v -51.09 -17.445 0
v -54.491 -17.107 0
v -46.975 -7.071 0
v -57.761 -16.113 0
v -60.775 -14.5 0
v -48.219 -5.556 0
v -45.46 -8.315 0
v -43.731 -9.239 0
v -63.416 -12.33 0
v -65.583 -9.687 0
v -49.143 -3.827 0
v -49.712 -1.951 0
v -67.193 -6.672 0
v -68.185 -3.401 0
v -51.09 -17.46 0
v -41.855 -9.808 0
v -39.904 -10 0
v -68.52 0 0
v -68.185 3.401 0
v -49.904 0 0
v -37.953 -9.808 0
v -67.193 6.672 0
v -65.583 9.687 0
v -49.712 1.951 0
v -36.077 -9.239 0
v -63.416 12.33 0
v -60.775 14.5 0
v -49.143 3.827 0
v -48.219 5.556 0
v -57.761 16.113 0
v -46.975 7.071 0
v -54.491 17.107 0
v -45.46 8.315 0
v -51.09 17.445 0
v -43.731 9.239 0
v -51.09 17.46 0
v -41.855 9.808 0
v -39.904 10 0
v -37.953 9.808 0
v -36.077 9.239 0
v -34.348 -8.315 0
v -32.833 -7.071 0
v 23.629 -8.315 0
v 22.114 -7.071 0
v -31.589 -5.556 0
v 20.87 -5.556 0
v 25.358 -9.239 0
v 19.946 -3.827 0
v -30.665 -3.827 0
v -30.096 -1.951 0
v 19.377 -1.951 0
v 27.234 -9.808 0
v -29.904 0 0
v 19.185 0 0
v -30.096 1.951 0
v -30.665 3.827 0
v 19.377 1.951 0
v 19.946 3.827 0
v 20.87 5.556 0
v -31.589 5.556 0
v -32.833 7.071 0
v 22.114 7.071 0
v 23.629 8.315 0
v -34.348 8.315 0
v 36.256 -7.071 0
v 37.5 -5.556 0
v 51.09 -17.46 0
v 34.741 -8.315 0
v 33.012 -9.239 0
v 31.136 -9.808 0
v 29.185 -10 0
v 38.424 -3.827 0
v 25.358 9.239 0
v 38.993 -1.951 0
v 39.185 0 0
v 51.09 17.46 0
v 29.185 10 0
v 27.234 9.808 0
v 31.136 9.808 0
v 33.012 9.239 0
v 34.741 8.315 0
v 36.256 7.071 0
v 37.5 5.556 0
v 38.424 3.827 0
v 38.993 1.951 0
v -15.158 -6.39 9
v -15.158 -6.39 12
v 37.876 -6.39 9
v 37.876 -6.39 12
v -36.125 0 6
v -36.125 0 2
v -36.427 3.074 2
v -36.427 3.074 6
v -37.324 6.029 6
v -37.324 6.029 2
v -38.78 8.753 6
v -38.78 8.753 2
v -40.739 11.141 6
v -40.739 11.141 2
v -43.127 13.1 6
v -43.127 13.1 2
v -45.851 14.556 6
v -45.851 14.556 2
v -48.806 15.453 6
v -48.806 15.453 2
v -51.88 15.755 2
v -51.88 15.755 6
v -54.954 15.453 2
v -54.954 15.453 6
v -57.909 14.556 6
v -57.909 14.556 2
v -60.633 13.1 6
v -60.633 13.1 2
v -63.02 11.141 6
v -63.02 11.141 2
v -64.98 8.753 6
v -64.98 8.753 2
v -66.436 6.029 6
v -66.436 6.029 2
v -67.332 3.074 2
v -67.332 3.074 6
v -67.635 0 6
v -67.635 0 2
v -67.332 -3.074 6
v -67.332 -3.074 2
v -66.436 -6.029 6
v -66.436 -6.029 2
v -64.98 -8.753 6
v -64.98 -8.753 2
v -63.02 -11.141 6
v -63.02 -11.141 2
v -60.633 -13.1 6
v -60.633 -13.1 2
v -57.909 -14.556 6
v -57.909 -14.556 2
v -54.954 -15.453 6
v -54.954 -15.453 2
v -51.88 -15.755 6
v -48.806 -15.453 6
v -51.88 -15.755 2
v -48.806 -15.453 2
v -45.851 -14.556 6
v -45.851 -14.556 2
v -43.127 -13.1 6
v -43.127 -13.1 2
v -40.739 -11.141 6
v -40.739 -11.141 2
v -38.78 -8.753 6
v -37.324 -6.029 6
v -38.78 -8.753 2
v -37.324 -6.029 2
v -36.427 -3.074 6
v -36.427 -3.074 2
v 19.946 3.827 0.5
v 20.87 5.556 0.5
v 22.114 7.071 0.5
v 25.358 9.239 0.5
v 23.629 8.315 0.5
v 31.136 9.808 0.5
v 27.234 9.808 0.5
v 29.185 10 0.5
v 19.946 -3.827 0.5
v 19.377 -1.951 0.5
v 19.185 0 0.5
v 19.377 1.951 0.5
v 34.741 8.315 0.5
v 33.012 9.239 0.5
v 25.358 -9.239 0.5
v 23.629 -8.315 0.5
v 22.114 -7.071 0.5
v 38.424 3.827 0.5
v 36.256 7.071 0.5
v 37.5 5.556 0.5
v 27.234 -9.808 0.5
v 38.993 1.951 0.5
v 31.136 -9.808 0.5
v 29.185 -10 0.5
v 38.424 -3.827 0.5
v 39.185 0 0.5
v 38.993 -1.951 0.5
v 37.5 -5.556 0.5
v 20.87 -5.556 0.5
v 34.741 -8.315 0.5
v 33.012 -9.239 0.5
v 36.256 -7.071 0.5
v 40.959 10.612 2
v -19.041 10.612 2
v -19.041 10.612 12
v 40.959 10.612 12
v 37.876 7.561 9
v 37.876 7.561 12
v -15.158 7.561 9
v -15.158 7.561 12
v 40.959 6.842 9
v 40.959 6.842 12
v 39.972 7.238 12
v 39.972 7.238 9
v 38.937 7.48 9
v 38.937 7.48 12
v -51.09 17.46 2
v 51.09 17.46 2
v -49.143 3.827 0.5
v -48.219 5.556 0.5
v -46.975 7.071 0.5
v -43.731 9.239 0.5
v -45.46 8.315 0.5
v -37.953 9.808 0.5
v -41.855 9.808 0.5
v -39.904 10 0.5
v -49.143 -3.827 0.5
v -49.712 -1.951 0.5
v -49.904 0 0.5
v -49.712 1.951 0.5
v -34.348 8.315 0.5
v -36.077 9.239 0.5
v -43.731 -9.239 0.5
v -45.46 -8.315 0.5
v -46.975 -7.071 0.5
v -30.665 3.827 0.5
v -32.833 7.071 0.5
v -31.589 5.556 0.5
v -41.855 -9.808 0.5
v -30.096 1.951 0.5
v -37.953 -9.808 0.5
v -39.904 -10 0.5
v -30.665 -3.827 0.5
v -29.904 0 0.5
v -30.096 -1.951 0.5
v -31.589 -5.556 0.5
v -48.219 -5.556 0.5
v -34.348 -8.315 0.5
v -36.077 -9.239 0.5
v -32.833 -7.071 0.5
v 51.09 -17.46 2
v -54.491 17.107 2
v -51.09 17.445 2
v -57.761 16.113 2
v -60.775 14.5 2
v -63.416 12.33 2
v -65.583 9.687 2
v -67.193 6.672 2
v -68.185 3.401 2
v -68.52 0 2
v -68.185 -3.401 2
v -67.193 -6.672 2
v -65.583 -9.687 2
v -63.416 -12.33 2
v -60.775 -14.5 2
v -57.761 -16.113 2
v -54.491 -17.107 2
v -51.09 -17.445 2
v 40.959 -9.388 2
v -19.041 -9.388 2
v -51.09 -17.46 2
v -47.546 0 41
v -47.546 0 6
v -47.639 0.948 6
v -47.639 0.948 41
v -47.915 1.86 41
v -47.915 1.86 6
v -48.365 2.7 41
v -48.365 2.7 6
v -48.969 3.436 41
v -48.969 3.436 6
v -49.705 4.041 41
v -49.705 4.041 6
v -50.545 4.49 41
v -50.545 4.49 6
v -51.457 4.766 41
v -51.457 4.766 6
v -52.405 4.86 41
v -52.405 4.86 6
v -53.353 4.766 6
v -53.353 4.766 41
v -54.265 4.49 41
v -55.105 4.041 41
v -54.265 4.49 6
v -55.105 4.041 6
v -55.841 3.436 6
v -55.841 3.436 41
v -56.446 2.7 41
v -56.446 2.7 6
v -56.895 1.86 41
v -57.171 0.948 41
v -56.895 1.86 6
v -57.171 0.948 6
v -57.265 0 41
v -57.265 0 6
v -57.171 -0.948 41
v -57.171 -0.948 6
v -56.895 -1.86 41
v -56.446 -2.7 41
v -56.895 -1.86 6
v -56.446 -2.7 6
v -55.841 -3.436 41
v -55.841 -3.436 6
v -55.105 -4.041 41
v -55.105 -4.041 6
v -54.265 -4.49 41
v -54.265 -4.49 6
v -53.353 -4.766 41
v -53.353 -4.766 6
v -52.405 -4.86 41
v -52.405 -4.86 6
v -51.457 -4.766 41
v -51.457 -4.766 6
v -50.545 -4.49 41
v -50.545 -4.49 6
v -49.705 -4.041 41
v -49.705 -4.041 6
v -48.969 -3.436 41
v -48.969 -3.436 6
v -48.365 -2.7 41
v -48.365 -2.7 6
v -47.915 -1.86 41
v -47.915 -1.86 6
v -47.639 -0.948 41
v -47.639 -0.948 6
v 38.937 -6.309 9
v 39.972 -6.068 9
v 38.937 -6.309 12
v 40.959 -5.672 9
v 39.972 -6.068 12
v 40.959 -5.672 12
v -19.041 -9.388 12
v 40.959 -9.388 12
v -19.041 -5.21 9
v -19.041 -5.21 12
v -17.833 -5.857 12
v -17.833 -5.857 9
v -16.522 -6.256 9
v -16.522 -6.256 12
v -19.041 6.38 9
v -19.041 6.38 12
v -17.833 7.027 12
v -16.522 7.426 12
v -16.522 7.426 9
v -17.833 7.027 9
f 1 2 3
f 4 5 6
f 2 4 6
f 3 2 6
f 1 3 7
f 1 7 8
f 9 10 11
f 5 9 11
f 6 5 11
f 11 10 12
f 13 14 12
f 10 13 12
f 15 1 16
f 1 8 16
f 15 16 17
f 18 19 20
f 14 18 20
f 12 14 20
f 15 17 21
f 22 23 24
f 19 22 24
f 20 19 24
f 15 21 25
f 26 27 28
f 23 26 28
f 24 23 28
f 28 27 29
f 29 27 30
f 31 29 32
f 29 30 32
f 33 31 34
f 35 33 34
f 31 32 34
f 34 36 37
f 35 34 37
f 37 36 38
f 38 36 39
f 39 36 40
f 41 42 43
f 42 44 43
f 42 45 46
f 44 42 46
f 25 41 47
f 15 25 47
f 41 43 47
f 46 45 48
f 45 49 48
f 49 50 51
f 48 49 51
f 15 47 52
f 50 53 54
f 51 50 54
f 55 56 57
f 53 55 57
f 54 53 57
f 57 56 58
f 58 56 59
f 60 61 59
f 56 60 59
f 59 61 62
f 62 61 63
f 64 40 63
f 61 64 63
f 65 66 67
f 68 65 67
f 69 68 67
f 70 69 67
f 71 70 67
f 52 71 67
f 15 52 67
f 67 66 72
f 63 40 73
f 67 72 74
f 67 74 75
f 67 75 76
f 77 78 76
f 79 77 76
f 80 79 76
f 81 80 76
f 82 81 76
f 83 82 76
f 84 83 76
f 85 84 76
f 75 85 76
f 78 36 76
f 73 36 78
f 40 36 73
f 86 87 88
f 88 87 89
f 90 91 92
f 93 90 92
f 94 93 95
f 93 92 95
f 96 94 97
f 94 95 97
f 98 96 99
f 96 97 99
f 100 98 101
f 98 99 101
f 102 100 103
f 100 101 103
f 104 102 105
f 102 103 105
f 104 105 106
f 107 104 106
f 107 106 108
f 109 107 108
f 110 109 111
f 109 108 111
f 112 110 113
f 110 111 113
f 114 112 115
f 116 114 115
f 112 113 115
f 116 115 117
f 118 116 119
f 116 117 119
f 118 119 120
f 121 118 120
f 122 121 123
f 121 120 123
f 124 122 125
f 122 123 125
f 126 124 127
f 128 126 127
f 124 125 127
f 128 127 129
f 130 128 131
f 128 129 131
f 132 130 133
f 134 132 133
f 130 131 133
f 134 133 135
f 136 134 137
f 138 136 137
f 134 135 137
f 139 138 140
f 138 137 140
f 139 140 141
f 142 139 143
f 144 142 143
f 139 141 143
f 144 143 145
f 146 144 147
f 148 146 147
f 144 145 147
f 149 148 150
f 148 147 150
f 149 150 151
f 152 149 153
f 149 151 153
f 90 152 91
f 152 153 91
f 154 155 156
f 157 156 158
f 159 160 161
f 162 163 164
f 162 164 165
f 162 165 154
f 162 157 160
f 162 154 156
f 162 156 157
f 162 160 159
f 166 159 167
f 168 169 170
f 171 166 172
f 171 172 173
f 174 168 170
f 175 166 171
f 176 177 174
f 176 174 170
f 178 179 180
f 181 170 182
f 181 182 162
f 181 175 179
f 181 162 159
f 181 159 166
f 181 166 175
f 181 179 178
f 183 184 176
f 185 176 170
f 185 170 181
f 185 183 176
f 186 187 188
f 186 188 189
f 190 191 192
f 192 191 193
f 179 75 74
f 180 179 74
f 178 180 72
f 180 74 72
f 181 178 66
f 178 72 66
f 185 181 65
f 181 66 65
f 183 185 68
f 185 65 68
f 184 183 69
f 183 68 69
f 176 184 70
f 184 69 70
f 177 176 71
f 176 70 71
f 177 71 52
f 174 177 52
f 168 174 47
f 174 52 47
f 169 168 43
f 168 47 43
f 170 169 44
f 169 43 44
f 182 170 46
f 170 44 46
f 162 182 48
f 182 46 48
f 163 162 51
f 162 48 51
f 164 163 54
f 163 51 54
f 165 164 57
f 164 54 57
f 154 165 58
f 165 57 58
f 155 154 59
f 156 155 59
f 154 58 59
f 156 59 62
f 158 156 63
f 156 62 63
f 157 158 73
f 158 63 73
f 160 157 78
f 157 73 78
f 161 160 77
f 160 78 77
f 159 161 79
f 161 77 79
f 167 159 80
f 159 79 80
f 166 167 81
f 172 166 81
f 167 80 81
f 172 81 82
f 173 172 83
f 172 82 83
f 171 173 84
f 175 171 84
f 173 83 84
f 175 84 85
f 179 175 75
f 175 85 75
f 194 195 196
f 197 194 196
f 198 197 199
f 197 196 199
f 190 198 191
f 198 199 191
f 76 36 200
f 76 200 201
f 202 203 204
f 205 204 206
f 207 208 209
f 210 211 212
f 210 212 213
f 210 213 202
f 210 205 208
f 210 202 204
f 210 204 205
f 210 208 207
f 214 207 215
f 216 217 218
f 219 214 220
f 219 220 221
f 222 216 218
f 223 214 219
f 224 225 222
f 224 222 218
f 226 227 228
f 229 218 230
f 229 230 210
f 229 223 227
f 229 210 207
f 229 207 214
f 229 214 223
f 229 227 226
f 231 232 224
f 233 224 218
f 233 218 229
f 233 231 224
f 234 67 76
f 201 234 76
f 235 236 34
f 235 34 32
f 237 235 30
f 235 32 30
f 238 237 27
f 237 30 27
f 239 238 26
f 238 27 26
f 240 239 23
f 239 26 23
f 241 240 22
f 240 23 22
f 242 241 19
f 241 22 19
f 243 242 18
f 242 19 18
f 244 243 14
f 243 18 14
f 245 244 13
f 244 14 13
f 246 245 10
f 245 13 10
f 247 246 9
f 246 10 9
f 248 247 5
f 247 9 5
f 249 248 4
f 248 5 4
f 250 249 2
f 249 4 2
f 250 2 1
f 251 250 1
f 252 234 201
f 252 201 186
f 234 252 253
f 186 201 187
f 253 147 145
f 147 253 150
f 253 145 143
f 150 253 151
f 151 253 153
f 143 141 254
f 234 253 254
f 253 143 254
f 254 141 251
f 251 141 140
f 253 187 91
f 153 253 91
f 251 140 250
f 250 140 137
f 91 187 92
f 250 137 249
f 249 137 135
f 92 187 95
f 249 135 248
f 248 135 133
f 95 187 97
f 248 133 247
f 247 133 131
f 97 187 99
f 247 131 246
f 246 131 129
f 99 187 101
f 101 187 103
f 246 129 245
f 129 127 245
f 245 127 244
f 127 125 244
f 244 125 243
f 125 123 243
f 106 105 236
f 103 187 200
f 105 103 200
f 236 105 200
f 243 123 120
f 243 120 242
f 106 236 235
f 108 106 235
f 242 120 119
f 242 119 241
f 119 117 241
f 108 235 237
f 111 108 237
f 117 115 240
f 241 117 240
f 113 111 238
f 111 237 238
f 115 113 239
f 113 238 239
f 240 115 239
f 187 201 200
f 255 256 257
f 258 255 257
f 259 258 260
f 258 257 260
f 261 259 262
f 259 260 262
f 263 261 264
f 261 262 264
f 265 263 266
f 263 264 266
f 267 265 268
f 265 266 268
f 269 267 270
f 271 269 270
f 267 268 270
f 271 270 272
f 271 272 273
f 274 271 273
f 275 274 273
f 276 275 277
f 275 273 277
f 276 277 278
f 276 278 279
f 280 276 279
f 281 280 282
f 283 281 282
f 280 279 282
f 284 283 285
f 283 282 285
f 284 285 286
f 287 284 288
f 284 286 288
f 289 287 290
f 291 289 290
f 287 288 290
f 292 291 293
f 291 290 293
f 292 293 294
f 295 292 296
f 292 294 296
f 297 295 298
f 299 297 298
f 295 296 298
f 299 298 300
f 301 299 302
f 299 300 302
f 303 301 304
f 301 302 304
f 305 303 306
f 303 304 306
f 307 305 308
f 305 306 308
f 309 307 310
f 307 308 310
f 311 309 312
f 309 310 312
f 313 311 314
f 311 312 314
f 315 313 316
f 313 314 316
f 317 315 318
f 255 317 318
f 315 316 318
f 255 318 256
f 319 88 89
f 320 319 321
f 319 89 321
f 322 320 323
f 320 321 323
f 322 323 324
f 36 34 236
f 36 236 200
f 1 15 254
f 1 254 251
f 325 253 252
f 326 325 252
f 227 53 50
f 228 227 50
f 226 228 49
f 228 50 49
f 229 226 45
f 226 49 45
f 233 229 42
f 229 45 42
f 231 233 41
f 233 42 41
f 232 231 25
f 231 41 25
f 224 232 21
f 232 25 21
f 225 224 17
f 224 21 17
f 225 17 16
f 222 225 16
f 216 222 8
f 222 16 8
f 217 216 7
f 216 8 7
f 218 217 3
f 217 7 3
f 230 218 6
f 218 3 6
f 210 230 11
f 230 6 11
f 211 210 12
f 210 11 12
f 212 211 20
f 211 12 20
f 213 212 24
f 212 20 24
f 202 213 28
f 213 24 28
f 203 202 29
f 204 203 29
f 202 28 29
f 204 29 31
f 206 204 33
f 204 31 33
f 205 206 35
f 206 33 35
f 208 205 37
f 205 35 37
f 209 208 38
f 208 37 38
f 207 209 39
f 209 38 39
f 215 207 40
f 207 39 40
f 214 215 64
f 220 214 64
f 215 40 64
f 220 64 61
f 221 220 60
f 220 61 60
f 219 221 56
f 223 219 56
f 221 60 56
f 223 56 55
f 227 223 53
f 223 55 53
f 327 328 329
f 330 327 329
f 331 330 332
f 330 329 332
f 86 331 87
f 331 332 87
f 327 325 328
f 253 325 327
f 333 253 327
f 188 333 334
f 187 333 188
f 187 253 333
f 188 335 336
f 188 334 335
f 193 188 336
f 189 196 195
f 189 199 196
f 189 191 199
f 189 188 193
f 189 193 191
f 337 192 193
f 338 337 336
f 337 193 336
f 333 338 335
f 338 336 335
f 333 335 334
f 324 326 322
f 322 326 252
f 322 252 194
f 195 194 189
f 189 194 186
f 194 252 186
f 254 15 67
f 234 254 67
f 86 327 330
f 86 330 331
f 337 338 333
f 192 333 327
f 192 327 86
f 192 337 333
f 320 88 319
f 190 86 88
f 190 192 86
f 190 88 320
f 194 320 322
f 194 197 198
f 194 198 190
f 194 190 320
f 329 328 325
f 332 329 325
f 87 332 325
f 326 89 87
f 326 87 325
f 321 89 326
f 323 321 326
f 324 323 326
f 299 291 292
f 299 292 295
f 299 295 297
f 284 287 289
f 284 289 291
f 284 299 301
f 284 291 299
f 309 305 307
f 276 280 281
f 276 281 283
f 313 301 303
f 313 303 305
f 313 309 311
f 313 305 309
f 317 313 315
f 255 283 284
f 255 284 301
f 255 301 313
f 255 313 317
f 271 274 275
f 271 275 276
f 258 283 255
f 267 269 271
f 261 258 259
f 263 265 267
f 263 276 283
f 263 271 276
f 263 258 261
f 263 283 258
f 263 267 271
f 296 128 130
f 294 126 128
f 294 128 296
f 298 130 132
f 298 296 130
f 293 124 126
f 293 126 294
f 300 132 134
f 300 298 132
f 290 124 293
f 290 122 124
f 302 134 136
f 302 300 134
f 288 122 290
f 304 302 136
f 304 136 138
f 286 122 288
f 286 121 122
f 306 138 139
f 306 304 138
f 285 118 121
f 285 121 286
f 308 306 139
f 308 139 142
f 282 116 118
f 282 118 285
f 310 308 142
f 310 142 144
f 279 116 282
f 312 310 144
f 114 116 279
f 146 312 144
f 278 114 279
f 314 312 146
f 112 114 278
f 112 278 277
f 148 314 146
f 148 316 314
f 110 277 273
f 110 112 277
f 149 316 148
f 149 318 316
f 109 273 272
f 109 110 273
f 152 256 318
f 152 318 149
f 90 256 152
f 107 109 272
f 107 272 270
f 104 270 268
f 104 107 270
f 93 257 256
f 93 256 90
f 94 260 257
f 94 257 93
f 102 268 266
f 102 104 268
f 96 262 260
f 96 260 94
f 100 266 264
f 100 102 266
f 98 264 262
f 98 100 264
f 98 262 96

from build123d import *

# Parameters (mm, degrees)
SKETCH_W        = 102.18
SKETCH_H        = 34.92
PAD_DEPTH       = 2
PAD001_DEPTH    = 2
SKETCH002_R     = 15.755262
PAD002_DEPTH    = 4
SKETCH003_R     = 4.859631
PAD003_DEPTH    = 35
SKETCH004_R     = 10
POCKET_DEPTH    = 0.5
SKETCH005_R     = 10
POCKET001_DEPTH = 0.5
SKETCH006_W     = 60
SKETCH006_H     = 20
PAD004_DEPTH    = 10
POCKET002_DEPTH = 3


with BuildPart() as part:
    # Sketch → Pad (new body)
    with BuildSketch(Plane.XY):
        Rectangle(SKETCH_W, SKETCH_H)
    extrude(amount=PAD_DEPTH)

    # Sketch001 → Pad001 (join)
    with BuildSketch(Plane.XY):
        with BuildLine():
            Line((-51.074825, 17.445), (-51.074825, -17.445))
            ThreePointArc((-51.074825, 17.445), (-68.519825, 0), (-51.074825, -17.445))
        make_face()
    extrude(amount=PAD001_DEPTH)

    # Sketch002 (on Face11 of Pad001) → Pad002 (join)
    with BuildSketch(Plane.XY.offset(2)):
        with Locations((-51.87981, 0)):
            Circle(SKETCH002_R)
    extrude(amount=PAD002_DEPTH)

    # Sketch003 (on Face15 of Pad002) → Pad003 (join)
    with BuildSketch(Plane.XY.offset(6)):
        with Locations((-52.405182, 0)):
            Circle(SKETCH003_R)
    extrude(amount=PAD003_DEPTH)

    # Sketch004 (on Face2 of Pad003) → Pocket (cut)
    with BuildSketch(Plane(origin=(0, 0, 0), x_dir=(1, 0, 0), z_dir=(0, 0, -1))):
        with Locations((29.185068, 0)):
            Circle(SKETCH004_R)
    extrude(amount=-POCKET_DEPTH, mode=Mode.SUBTRACT)

    # Sketch005 (on Face2 of Pocket) → Pocket001 (cut)
    with BuildSketch(Plane(origin=(0, 0, 0), x_dir=(1, 0, 0), z_dir=(0, 0, -1))):
        with Locations((-39.903818, 0)):
            Circle(SKETCH005_R)
    extrude(amount=-POCKET001_DEPTH, mode=Mode.SUBTRACT)

    # Sketch006 (on Face4 of Pocket001) → Pad004 (join)
    with BuildSketch(Plane.XY.offset(2)):
        with Locations((10.959466, 0.612018)):
            Rectangle(SKETCH006_W, SKETCH006_H)
    extrude(amount=PAD004_DEPTH)

    # Sketch007 (on DatumPlane) → Pocket002 (cut)
    with BuildSketch(Plane.XY.offset(12)):
        with BuildLine():
            ThreePointArc((-15.157894, 7.560673), (-22.133381, 0.585186), (-15.157894, -6.390301))
            Line((-15.157894, -6.390301), (37.876255, -6.390301))
            ThreePointArc((37.876255, -6.390301), (44.851742, 0.585186), (37.876255, 7.560673))
            Line((37.876255, 7.560673), (-15.157894, 7.560673))
        make_face()
    extrude(amount=-POCKET002_DEPTH, mode=Mode.SUBTRACT)


solid = part.part
